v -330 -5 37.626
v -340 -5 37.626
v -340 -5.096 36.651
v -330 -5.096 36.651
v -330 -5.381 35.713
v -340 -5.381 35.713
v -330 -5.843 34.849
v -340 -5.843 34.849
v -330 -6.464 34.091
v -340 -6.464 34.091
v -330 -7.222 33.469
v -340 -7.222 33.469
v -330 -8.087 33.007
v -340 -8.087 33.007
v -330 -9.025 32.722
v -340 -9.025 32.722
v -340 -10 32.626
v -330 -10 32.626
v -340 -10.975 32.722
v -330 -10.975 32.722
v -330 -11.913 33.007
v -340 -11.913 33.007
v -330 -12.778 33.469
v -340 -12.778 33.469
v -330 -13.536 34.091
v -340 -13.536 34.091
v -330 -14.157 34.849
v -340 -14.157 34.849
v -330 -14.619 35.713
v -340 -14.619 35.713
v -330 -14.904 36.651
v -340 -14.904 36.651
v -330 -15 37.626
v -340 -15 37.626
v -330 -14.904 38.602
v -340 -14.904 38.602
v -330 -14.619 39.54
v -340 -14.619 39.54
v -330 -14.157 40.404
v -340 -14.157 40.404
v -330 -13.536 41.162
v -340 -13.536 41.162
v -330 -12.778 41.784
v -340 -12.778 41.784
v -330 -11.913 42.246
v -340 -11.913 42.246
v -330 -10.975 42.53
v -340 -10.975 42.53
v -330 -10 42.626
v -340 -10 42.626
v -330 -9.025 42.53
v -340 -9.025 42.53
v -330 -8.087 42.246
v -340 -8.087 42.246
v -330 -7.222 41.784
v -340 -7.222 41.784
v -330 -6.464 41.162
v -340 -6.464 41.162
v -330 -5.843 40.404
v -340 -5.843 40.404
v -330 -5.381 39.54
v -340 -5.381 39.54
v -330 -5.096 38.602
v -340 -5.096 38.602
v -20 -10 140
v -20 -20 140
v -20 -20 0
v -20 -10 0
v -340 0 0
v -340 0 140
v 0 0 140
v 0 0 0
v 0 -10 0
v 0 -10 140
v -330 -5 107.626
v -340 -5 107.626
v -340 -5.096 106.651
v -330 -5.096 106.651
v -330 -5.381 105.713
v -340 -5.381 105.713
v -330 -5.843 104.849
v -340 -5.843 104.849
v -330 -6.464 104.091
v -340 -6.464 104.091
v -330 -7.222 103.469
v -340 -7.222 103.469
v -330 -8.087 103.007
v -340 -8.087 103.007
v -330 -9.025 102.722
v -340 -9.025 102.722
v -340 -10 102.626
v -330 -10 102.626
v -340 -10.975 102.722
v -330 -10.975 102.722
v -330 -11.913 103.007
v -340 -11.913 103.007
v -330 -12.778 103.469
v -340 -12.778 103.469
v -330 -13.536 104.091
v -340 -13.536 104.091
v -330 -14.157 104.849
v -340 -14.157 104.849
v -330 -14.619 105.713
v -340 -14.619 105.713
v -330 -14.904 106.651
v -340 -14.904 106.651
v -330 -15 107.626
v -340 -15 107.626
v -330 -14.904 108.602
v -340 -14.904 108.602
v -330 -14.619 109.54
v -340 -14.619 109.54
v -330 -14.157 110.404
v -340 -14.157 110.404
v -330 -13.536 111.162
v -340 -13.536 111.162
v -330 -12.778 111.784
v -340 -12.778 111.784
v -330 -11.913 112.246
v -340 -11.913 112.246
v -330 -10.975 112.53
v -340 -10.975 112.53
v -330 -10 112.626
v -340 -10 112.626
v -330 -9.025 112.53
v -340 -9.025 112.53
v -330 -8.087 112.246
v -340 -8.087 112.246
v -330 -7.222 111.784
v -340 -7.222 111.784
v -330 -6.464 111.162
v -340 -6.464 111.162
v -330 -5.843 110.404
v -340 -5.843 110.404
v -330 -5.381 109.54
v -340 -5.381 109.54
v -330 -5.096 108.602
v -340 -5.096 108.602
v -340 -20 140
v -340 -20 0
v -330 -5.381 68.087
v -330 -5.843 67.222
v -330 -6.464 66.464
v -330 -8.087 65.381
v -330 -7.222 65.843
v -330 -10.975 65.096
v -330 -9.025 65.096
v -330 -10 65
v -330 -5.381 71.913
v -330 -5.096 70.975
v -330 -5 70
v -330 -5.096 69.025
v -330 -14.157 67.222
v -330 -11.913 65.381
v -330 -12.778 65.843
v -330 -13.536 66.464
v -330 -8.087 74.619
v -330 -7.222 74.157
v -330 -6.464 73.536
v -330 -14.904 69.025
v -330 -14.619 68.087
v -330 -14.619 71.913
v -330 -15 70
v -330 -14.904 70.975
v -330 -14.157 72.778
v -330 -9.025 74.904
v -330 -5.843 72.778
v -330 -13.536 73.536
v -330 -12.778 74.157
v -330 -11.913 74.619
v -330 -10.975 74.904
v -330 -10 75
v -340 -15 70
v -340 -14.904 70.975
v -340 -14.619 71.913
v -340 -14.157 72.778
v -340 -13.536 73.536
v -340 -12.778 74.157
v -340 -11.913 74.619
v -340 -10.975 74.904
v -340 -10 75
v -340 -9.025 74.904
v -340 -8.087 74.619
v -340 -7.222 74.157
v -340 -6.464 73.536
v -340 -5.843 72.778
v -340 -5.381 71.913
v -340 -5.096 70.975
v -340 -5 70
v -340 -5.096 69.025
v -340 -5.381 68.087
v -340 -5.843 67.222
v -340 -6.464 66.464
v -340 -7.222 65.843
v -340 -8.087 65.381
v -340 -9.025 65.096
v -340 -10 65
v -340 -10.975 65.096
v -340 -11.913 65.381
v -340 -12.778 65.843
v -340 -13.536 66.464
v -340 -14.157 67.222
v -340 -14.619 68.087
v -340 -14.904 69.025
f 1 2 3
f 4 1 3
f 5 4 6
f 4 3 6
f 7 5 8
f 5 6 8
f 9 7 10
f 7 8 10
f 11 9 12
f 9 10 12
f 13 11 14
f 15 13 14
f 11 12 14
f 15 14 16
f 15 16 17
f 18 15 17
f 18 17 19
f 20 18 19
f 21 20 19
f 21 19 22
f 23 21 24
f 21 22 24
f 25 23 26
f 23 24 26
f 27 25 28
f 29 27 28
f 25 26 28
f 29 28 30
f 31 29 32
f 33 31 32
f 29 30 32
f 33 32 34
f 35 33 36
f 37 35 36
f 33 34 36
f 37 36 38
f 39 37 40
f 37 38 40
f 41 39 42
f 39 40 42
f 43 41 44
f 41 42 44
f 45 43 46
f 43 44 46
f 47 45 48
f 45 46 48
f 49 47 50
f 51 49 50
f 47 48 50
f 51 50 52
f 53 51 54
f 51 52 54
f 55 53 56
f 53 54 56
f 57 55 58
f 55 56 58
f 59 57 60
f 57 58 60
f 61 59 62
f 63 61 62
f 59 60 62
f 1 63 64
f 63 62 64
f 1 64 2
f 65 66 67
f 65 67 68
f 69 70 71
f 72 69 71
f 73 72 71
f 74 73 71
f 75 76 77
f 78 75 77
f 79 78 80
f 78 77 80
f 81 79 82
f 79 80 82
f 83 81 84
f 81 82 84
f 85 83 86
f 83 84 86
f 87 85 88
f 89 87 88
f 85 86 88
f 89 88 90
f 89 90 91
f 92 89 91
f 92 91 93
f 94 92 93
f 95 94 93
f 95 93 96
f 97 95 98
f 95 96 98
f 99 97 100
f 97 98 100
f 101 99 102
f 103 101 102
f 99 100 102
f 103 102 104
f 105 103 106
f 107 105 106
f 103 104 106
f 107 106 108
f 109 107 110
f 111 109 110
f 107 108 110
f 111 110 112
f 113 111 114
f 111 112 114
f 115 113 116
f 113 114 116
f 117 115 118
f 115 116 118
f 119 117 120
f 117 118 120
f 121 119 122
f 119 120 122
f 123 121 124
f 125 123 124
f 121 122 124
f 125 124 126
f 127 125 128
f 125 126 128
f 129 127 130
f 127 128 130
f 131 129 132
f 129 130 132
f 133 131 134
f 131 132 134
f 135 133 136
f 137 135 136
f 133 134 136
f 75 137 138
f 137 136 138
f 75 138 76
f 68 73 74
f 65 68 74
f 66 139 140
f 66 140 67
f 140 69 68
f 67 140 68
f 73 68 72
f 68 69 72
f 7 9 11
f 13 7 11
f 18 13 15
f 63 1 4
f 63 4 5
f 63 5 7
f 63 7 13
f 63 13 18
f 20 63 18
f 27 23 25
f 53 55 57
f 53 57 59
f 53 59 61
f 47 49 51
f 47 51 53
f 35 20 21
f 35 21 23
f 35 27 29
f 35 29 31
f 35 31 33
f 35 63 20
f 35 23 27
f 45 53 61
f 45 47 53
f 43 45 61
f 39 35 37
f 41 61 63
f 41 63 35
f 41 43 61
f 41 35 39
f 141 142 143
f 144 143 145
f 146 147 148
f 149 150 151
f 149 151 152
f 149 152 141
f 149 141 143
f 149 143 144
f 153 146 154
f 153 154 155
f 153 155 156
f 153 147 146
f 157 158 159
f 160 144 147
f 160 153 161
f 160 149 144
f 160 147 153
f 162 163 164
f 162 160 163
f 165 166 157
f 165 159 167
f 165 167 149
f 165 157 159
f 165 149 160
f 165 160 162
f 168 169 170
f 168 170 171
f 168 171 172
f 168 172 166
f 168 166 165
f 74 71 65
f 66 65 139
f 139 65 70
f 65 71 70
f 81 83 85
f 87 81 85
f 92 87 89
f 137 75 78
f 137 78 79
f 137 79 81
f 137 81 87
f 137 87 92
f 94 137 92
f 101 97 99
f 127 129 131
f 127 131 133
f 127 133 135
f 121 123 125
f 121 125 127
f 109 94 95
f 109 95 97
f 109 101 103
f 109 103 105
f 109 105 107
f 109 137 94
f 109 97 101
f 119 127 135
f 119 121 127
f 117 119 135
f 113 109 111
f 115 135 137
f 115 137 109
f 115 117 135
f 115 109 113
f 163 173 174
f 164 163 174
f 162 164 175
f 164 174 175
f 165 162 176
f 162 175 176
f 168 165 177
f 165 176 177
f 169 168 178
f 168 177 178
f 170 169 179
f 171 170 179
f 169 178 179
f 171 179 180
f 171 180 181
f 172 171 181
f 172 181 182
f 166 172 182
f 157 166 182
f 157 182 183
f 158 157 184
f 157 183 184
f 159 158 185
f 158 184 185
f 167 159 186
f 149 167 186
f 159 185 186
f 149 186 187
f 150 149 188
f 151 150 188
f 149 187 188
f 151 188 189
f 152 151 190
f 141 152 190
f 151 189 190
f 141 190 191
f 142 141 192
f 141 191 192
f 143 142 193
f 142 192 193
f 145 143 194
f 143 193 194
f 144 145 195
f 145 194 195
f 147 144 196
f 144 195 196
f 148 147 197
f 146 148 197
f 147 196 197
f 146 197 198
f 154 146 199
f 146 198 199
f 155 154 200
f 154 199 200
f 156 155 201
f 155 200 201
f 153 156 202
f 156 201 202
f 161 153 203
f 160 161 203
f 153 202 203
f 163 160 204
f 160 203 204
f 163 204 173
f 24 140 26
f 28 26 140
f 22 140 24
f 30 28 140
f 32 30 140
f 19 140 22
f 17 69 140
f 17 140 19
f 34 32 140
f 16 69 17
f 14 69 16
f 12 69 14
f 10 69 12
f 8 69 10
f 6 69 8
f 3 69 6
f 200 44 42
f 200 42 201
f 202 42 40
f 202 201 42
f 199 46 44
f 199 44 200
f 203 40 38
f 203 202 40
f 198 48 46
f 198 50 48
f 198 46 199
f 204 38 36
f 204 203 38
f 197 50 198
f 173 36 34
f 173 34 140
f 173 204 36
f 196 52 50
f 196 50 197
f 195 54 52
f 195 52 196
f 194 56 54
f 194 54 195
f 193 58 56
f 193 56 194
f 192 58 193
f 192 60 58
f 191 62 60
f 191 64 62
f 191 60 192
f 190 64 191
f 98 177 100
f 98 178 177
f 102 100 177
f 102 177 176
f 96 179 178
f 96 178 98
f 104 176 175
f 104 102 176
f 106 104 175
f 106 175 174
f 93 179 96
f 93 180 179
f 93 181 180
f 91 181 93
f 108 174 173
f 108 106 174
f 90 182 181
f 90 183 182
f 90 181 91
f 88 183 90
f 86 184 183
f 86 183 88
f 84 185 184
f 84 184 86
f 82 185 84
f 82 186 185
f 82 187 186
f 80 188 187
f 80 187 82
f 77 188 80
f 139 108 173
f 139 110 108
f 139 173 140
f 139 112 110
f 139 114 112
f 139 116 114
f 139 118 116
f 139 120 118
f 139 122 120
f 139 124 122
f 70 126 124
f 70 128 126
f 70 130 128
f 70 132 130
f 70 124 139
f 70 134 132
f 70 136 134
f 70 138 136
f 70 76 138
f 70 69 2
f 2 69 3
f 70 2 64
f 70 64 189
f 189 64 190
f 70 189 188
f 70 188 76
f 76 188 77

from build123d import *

# Parameters (mm, degrees)
F0_W     = 20
F0_H     = 140
F0_W_2   = 320
F1_DEPTH = 20
F2_W     = 10
F2_H     = 140
F3_DEPTH = 20
F5_DEPTH = 10


with BuildPart() as f1:
    # F0 (on Front) → F1 (new body)
    with BuildSketch(Plane.XZ):
        with Locations((-330, 70)):
            Rectangle(F0_W, F0_H)
        with Locations((-160, 70)):
            Rectangle(F0_W_2, F0_H)
    extrude(amount=F1_DEPTH)

    # F2 (on face) → F3 (cut)
    with BuildSketch(Plane.YZ):
        with Locations((-15, 70)):
            Rectangle(F2_W, F2_H)
    extrude(amount=-F3_DEPTH, mode=Mode.SUBTRACT)

    # F4 (on face) → F5 (cut)
    with BuildSketch(Plane(origin=(-340, 0, 0), x_dir=(0, -1, 0), z_dir=(-1, 0, 0))):
        with BuildLine():
            ThreePointArc((15, 37.6264154911), (10, 42.6264154911), (5, 37.6264154911))
            Line((5, 37.6264154911), (15, 37.6264154911))
        make_face()
        with BuildLine():
            Line((15, 37.6264154911), (5, 37.6264154911))
            ThreePointArc((5, 37.6264154911), (10, 32.6264154911), (15, 37.6264154911))
        make_face()
        with BuildLine():
            ThreePointArc((15, 107.6264154911), (10, 112.6264154911), (5, 107.6264154911))
            Line((5, 107.6264154911), (15, 107.6264154911))
        make_face()
        with BuildLine():
            Line((15, 107.6264154911), (5, 107.6264154911))
            ThreePointArc((5, 107.6264154911), (10, 102.6264154911), (15, 107.6264154911))
        make_face()
        with BuildLine():
            Line((15, 70), (5, 70))
            ThreePointArc((5, 70), (10, 65), (15, 70))
        make_face()
        with BuildLine():
            ThreePointArc((15, 70), (10, 75), (5, 70))
            Line((5, 70), (15, 70))
        make_face()
    extrude(amount=-F5_DEPTH, mode=Mode.SUBTRACT)


solid = f1.part
